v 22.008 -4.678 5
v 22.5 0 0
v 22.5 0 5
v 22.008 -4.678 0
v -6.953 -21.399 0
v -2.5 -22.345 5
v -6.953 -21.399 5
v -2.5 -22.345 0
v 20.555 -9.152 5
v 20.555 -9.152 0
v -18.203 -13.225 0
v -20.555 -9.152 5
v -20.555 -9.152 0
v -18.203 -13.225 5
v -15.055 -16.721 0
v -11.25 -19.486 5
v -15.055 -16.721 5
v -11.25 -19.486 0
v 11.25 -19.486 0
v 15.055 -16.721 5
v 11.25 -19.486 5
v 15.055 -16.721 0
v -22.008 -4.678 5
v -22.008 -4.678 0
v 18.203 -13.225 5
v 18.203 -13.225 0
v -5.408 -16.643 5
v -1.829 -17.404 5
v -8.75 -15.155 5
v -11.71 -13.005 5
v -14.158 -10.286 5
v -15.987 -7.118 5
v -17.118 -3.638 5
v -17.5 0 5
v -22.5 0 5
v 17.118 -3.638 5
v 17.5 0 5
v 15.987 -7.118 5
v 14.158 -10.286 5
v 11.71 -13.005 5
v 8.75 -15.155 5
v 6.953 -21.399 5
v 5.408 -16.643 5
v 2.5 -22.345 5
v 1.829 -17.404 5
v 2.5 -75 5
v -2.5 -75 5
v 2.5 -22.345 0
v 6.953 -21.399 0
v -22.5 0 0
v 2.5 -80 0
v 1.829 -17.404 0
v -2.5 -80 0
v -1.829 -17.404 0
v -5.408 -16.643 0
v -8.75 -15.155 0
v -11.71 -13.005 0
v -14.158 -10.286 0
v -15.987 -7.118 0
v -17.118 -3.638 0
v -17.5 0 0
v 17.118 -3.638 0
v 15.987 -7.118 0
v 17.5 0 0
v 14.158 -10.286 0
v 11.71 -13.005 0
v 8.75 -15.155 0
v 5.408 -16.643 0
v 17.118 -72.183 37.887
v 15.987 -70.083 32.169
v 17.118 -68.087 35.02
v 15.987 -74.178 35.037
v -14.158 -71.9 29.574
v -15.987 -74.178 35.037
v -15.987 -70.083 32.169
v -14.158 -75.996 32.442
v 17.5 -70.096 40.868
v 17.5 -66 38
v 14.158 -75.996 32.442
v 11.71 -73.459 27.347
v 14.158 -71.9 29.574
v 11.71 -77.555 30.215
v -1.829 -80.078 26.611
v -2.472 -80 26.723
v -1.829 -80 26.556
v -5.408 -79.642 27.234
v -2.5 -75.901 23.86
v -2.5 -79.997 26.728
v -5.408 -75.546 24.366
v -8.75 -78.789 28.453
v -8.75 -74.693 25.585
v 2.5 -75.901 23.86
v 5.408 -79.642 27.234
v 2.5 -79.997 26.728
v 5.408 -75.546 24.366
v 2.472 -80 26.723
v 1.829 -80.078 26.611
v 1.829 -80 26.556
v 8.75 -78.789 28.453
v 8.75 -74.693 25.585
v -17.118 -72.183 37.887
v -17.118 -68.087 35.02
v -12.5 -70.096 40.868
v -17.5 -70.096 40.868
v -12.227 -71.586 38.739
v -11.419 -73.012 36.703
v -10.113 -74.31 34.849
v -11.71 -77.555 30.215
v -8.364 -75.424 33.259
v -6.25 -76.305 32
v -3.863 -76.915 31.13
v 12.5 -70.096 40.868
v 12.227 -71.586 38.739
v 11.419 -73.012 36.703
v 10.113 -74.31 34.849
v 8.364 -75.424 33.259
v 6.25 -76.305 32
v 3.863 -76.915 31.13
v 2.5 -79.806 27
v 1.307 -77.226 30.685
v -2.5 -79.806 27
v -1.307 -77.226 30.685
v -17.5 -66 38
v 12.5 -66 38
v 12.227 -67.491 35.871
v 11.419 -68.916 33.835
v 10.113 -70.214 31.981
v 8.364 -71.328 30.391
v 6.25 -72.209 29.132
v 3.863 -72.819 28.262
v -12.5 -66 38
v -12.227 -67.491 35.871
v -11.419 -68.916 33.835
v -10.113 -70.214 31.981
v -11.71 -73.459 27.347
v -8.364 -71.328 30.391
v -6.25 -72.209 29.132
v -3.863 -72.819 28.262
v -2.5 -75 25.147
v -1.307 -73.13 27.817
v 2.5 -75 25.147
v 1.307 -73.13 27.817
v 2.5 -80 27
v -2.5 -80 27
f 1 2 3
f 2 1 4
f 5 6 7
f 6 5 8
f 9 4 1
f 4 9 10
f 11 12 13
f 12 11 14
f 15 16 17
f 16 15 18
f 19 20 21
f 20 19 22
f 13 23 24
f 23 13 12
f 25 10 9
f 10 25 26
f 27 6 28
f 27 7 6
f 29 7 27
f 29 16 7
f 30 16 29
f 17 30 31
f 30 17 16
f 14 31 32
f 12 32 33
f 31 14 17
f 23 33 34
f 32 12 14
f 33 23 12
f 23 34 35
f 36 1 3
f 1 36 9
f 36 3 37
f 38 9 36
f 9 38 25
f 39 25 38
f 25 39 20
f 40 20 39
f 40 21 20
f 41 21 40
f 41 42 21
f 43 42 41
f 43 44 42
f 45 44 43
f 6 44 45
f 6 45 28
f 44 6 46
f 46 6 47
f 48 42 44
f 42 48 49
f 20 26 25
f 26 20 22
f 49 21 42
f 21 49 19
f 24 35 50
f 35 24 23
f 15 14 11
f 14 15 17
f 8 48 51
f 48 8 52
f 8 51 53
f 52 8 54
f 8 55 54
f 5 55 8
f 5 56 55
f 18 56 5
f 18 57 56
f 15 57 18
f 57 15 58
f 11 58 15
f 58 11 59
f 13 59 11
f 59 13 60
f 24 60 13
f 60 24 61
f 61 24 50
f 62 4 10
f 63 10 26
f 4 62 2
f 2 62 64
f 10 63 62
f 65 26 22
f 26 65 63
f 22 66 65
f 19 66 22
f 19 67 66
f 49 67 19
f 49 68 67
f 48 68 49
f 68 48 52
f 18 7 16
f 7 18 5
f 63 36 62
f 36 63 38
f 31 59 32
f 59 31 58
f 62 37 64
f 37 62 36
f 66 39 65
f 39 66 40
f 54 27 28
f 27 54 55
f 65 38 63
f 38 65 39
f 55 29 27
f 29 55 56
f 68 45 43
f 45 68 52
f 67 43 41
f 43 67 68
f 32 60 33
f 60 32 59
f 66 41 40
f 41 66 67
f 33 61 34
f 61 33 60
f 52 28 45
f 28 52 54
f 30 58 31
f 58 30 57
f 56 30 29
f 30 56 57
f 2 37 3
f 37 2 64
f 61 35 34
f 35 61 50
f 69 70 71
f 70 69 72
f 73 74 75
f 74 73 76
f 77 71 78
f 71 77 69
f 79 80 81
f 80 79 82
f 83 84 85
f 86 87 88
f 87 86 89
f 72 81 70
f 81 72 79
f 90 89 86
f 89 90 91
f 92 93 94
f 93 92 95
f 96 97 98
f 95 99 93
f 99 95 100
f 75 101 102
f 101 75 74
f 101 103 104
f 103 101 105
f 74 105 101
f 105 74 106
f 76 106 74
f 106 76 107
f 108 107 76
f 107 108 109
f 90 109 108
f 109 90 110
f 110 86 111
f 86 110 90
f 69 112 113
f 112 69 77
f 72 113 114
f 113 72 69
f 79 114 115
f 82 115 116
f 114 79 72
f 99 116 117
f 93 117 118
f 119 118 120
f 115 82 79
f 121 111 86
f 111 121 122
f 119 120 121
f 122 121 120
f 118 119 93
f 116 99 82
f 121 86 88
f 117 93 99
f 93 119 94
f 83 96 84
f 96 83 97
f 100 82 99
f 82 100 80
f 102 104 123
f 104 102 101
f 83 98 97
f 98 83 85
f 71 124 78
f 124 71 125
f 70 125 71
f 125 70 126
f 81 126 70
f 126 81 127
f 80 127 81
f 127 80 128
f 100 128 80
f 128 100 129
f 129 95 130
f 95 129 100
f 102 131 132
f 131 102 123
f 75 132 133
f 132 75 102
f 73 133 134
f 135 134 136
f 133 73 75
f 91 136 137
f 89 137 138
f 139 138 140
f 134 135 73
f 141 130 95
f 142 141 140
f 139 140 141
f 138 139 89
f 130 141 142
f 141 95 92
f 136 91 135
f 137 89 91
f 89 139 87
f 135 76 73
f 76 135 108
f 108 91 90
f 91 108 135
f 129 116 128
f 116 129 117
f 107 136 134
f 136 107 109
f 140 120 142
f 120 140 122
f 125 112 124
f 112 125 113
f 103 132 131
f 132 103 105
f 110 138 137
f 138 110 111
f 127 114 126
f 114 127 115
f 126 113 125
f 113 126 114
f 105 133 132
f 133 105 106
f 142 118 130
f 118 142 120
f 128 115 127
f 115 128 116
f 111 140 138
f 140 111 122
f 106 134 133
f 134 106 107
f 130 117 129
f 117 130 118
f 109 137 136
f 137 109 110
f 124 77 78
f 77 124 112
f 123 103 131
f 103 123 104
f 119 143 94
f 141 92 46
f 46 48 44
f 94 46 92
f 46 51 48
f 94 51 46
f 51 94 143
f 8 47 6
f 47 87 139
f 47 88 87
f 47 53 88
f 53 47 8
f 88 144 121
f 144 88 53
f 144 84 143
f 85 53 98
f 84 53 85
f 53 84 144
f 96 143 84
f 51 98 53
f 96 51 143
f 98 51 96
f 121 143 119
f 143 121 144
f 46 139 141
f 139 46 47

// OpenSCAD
module moon(d, h) {
  difference() {
    r = d/2;
    outer = r+5;
    t = 1;
    cylinder(r=outer, h=h);

    translate([0, 0, -t/2])
    cylinder(r=r, h=h+t);

    translate([-outer, 0, -t/2])
    cube([outer*2 + t*2, outer + t, h+t]);
  }
}


moon(35, 5);

translate([0, -66, 38])
rotate([55, 0, 0])
moon(25, 5);

translate([-2.5, -80, 0])
cube([5, 60, 5]);

translate([-2.5, -80, 0])
cube([5, 5, 27]);
